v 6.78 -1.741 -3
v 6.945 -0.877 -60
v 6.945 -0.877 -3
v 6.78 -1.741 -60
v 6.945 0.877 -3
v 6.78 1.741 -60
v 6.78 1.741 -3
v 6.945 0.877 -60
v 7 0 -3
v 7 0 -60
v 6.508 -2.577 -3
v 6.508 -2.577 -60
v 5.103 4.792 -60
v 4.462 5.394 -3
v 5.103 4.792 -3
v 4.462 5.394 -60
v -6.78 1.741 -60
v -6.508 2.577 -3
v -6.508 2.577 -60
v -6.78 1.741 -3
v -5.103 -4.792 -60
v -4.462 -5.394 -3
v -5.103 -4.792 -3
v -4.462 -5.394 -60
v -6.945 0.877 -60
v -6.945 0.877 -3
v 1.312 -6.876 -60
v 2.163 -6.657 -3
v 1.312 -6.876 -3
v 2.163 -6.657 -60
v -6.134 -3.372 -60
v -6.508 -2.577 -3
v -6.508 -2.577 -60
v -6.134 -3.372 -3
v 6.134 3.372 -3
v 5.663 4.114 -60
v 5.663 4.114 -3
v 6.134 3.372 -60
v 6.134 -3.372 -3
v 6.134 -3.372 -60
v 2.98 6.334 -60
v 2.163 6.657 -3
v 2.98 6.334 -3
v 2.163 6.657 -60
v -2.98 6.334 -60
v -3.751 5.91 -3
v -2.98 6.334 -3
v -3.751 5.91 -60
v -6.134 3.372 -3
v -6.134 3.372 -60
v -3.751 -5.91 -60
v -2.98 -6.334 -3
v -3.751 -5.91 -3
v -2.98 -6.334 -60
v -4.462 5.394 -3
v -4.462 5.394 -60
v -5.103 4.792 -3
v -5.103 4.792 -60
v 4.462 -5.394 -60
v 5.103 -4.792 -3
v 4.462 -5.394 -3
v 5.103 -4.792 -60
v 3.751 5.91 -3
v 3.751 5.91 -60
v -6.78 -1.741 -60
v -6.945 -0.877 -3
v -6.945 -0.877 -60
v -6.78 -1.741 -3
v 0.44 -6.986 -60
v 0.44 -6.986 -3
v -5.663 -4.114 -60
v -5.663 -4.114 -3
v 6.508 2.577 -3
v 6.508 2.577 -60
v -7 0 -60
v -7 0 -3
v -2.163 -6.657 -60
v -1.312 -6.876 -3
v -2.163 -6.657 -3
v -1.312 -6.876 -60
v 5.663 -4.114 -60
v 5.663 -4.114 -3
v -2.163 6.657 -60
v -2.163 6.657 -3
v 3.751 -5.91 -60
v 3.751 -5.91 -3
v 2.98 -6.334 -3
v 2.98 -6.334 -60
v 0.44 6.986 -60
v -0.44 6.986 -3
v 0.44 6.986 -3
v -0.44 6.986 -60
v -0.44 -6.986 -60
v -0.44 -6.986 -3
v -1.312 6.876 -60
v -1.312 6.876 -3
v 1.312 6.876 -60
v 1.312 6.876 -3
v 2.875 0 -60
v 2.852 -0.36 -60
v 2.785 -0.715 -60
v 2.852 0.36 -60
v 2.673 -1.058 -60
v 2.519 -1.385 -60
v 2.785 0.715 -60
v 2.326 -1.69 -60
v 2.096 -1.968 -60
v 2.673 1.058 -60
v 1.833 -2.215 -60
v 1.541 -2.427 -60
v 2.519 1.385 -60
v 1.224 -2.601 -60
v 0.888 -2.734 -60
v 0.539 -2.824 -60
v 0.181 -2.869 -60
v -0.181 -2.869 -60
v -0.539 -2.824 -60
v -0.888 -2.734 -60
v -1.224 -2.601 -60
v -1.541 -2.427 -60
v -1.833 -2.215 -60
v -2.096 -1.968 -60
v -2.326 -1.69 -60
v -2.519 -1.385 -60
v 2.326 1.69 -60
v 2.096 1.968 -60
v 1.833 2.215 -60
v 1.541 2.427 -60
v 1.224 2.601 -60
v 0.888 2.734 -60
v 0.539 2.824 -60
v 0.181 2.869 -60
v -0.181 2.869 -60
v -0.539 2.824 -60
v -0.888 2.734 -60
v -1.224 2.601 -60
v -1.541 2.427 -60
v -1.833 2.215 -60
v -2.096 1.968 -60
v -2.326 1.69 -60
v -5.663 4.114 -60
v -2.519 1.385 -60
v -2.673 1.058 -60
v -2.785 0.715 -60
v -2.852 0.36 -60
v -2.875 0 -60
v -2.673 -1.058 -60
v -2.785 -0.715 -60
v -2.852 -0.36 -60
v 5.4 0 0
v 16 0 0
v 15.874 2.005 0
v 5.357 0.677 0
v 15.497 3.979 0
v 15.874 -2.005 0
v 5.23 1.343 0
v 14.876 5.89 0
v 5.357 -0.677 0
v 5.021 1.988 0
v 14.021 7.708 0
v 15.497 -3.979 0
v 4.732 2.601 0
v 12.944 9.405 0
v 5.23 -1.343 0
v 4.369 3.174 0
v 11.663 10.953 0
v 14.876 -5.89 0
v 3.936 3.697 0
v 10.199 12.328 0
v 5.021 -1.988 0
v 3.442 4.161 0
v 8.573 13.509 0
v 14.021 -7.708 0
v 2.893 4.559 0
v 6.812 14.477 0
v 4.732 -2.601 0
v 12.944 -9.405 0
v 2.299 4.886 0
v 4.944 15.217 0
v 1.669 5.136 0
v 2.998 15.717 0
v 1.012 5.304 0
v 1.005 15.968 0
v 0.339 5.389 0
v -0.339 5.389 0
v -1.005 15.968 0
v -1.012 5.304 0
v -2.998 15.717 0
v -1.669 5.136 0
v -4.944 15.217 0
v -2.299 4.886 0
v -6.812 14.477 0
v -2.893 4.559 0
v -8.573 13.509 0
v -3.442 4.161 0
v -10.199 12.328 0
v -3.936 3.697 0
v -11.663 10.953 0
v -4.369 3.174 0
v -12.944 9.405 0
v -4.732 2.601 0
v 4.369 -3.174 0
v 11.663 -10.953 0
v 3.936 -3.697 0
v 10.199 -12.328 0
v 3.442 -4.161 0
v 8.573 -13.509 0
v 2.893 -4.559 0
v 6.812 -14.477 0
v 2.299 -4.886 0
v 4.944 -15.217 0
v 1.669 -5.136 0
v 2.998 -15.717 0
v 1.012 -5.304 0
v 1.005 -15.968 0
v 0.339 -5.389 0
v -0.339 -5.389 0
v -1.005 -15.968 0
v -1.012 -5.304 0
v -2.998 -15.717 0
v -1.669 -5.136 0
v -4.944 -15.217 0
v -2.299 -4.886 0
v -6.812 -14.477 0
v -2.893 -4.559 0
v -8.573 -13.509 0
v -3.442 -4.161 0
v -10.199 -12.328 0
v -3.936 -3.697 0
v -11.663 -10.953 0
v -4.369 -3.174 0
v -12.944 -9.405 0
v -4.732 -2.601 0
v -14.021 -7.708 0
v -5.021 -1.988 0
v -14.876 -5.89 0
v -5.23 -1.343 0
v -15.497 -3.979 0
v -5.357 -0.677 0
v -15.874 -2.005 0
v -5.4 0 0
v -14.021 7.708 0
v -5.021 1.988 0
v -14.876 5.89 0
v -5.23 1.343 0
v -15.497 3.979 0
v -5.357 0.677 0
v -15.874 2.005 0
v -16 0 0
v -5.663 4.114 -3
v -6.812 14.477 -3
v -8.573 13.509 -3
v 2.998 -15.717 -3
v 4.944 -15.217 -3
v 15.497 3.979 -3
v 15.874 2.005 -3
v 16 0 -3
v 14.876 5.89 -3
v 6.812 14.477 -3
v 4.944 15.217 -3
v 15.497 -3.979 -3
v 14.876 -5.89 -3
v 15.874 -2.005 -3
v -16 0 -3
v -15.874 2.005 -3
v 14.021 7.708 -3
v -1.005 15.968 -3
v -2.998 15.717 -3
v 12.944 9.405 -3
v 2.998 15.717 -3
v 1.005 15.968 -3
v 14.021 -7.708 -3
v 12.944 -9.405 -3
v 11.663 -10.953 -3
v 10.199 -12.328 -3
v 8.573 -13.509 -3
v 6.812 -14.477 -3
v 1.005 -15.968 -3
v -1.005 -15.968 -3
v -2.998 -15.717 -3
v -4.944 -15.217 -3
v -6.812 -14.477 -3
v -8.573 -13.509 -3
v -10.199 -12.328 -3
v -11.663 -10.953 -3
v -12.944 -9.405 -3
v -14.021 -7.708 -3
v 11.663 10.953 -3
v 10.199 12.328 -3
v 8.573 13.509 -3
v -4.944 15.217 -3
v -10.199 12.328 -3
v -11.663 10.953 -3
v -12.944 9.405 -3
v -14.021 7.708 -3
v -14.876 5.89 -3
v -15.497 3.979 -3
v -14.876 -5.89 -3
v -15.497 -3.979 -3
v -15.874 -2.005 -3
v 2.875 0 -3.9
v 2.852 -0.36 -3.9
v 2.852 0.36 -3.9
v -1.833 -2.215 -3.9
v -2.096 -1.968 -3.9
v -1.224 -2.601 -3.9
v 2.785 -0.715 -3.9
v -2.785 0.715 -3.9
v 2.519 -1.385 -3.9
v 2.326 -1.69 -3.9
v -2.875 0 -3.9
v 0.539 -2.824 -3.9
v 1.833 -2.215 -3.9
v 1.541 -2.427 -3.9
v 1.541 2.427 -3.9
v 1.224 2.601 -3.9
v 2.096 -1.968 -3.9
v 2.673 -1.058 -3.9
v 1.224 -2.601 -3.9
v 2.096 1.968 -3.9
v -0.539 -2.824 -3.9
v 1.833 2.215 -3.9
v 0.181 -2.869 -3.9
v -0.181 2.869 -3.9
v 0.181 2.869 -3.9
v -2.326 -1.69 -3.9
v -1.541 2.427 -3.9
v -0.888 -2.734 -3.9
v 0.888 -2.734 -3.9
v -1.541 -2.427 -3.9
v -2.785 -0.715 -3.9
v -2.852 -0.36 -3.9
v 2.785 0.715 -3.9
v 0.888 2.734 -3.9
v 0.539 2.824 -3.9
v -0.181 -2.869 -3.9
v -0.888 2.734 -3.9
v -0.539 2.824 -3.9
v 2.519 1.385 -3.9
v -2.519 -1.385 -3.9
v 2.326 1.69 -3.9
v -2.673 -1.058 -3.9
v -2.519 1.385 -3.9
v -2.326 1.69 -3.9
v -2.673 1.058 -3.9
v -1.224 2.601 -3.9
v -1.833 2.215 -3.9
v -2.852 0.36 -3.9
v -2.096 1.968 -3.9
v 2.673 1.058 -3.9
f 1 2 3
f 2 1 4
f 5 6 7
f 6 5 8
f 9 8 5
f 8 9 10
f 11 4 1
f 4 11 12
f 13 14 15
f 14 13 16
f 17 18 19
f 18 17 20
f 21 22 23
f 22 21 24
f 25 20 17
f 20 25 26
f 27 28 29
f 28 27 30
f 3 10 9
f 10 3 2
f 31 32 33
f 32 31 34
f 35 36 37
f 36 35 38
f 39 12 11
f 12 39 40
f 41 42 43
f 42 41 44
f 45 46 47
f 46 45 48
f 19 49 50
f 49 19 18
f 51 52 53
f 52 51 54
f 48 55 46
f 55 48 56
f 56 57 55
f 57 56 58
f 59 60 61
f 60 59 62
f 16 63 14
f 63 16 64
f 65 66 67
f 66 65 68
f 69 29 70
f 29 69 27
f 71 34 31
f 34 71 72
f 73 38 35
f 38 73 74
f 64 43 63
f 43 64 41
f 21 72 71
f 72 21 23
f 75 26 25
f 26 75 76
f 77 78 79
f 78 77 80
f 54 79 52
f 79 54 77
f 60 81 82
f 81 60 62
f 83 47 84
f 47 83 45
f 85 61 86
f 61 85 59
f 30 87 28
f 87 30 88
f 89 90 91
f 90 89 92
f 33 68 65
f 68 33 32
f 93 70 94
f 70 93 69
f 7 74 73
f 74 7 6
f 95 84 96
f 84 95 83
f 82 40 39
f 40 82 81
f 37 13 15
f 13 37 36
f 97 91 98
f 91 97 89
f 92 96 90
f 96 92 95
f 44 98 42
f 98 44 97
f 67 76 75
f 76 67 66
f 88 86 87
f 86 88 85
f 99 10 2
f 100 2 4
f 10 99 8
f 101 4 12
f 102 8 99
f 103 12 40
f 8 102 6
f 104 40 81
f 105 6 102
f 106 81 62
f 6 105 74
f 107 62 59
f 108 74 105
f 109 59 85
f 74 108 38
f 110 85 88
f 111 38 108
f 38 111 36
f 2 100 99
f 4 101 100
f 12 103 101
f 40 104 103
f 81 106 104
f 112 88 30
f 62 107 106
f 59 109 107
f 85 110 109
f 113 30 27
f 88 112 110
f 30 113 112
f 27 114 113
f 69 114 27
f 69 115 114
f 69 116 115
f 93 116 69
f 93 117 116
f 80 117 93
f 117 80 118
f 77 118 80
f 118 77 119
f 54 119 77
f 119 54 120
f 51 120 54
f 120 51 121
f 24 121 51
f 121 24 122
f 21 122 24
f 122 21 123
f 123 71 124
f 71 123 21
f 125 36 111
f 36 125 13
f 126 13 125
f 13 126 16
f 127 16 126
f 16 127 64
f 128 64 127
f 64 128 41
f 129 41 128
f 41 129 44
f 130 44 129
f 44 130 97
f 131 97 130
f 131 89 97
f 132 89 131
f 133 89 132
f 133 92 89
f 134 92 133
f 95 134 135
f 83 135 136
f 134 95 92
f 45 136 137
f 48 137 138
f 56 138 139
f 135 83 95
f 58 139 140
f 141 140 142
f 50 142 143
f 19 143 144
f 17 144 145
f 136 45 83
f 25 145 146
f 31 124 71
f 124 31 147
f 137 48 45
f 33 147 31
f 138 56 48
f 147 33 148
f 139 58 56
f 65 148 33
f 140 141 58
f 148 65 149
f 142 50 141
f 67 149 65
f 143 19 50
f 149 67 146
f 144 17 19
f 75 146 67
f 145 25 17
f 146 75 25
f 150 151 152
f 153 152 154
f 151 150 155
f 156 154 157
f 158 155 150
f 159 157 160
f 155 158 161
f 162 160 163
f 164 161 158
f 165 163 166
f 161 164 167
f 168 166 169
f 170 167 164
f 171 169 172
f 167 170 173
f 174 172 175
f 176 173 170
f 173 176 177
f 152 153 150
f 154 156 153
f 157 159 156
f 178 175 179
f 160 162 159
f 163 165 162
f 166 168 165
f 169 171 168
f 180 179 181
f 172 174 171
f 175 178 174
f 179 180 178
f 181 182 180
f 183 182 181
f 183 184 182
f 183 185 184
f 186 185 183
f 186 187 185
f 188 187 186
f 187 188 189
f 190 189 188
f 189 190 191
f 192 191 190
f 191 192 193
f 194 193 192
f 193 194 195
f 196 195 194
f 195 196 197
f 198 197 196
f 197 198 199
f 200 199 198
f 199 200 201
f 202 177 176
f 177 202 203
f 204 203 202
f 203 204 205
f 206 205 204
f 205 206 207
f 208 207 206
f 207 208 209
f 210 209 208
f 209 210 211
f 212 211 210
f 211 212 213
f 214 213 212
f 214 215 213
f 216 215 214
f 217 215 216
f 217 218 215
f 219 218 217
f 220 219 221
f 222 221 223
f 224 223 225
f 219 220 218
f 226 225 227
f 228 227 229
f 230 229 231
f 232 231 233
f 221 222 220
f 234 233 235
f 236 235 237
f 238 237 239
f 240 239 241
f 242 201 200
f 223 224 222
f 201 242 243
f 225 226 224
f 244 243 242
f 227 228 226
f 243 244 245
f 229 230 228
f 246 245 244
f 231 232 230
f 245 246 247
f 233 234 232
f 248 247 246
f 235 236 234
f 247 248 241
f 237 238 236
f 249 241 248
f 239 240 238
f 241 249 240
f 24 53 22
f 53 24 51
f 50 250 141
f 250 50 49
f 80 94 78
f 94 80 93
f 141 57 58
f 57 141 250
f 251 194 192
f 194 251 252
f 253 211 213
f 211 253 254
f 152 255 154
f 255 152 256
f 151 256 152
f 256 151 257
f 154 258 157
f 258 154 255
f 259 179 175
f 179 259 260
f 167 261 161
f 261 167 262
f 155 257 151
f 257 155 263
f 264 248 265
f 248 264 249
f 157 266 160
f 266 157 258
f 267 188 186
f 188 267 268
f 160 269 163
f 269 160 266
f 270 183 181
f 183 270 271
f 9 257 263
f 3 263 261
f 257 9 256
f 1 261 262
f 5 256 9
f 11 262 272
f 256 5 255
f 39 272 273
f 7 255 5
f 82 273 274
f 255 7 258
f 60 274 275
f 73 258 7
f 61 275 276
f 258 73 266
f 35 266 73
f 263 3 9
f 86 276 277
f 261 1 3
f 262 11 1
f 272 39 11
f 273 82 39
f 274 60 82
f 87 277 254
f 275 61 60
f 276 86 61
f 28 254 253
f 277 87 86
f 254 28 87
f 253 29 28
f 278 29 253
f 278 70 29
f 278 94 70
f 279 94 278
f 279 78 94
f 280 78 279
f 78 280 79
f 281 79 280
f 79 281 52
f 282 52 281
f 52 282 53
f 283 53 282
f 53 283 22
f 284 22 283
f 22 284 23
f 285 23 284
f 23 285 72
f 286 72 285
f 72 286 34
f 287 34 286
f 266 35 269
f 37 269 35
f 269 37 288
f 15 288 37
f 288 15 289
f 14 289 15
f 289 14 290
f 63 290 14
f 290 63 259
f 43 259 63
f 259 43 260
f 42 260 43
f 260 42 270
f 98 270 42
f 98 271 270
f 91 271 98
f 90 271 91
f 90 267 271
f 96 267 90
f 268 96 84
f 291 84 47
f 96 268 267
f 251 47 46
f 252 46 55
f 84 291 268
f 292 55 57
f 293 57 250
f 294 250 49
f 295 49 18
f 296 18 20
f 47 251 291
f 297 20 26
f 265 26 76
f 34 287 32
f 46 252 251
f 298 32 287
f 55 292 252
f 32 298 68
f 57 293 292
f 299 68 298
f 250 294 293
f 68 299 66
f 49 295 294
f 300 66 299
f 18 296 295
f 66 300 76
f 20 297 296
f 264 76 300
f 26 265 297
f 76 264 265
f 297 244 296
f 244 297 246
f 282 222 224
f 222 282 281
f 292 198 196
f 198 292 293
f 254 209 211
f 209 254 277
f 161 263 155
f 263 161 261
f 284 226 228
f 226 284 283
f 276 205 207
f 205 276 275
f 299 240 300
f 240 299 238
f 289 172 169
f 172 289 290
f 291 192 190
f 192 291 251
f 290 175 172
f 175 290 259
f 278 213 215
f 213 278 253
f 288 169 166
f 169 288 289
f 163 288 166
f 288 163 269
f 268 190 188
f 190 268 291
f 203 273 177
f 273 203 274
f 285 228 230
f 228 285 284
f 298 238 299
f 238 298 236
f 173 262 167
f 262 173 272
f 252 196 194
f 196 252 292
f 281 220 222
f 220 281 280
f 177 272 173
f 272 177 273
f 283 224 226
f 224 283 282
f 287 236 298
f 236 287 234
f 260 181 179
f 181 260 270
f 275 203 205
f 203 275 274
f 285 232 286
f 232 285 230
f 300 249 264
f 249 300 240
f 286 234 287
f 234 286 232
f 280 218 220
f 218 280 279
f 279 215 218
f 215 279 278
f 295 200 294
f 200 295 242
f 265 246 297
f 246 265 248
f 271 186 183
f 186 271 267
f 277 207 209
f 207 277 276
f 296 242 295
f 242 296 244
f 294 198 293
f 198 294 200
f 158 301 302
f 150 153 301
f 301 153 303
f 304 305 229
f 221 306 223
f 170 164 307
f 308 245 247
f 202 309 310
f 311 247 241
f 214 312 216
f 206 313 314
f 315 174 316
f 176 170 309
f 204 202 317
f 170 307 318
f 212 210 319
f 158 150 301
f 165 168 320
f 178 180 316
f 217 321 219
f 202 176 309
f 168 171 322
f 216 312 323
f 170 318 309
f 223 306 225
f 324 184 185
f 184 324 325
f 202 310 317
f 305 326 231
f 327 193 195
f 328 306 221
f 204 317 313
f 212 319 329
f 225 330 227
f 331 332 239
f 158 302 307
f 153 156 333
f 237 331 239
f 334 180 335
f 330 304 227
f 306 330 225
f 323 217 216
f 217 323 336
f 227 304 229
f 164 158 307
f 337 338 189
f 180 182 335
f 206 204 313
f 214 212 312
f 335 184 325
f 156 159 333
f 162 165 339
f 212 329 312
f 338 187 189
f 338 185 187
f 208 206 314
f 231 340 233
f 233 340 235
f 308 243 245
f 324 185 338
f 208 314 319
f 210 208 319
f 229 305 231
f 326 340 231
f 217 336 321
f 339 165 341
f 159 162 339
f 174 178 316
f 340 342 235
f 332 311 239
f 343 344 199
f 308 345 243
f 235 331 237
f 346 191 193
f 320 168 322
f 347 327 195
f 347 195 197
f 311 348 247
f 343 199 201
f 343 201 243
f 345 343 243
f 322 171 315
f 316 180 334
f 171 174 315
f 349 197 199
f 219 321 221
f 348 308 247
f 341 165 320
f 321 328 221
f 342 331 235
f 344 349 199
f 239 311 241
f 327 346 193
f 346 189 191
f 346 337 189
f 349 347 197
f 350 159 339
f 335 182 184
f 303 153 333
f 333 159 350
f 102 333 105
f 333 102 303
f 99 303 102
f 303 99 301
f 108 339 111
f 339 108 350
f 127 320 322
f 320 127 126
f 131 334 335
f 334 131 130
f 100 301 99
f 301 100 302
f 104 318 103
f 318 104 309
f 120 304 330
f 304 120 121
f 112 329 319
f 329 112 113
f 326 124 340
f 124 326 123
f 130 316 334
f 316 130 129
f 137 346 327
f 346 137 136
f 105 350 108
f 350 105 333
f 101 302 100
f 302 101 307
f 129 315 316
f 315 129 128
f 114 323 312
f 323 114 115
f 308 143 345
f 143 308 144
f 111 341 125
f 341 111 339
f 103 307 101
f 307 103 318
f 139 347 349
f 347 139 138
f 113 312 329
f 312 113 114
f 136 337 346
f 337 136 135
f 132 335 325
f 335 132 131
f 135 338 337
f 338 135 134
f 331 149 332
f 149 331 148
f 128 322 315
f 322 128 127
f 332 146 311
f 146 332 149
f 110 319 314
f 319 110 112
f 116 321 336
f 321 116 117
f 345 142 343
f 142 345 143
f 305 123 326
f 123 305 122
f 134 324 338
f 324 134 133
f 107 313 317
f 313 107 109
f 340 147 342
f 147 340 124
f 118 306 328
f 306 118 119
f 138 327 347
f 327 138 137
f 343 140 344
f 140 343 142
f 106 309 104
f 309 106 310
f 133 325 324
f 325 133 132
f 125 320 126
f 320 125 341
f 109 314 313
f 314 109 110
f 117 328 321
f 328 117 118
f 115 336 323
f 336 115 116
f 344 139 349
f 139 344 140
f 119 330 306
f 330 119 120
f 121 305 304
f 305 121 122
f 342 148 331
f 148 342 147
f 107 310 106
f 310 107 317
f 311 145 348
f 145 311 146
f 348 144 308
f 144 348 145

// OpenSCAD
$fn = 50;


difference() {
	union() {
		translate(v = [0, 0, -60.0000000000]) {
			cylinder(h = 60, r = 7.0000000000);
		}
		translate(v = [0, 0, -3.0000000000]) {
			cylinder(h = 3, r = 16.0000000000);
		}
	}
	union() {
		translate(v = [0, 0, 0]) {
			rotate(a = [0, 0, 0]) {
				difference() {
					union() {
						#translate(v = [0, 0, -60.0000000000]) {
							cylinder(h = 60, r = 2.6000000000);
						}
						#translate(v = [0, 0, -3.9000000000]) {
							cylinder(h = 3.9000000000, r = 7.0000000000, r1 = 2.8750000000, r2 = 5.4000000000);
						}
						#translate(v = [0, 0, -60.0000000000]) {
							cylinder(h = 60, r = 2.8750000000);
						}
						#translate(v = [0, 0, -60.0000000000]) {
							cylinder(h = 60, r = 2.6000000000);
						}
					}
					union();
				}
			}
		}
	}
}
